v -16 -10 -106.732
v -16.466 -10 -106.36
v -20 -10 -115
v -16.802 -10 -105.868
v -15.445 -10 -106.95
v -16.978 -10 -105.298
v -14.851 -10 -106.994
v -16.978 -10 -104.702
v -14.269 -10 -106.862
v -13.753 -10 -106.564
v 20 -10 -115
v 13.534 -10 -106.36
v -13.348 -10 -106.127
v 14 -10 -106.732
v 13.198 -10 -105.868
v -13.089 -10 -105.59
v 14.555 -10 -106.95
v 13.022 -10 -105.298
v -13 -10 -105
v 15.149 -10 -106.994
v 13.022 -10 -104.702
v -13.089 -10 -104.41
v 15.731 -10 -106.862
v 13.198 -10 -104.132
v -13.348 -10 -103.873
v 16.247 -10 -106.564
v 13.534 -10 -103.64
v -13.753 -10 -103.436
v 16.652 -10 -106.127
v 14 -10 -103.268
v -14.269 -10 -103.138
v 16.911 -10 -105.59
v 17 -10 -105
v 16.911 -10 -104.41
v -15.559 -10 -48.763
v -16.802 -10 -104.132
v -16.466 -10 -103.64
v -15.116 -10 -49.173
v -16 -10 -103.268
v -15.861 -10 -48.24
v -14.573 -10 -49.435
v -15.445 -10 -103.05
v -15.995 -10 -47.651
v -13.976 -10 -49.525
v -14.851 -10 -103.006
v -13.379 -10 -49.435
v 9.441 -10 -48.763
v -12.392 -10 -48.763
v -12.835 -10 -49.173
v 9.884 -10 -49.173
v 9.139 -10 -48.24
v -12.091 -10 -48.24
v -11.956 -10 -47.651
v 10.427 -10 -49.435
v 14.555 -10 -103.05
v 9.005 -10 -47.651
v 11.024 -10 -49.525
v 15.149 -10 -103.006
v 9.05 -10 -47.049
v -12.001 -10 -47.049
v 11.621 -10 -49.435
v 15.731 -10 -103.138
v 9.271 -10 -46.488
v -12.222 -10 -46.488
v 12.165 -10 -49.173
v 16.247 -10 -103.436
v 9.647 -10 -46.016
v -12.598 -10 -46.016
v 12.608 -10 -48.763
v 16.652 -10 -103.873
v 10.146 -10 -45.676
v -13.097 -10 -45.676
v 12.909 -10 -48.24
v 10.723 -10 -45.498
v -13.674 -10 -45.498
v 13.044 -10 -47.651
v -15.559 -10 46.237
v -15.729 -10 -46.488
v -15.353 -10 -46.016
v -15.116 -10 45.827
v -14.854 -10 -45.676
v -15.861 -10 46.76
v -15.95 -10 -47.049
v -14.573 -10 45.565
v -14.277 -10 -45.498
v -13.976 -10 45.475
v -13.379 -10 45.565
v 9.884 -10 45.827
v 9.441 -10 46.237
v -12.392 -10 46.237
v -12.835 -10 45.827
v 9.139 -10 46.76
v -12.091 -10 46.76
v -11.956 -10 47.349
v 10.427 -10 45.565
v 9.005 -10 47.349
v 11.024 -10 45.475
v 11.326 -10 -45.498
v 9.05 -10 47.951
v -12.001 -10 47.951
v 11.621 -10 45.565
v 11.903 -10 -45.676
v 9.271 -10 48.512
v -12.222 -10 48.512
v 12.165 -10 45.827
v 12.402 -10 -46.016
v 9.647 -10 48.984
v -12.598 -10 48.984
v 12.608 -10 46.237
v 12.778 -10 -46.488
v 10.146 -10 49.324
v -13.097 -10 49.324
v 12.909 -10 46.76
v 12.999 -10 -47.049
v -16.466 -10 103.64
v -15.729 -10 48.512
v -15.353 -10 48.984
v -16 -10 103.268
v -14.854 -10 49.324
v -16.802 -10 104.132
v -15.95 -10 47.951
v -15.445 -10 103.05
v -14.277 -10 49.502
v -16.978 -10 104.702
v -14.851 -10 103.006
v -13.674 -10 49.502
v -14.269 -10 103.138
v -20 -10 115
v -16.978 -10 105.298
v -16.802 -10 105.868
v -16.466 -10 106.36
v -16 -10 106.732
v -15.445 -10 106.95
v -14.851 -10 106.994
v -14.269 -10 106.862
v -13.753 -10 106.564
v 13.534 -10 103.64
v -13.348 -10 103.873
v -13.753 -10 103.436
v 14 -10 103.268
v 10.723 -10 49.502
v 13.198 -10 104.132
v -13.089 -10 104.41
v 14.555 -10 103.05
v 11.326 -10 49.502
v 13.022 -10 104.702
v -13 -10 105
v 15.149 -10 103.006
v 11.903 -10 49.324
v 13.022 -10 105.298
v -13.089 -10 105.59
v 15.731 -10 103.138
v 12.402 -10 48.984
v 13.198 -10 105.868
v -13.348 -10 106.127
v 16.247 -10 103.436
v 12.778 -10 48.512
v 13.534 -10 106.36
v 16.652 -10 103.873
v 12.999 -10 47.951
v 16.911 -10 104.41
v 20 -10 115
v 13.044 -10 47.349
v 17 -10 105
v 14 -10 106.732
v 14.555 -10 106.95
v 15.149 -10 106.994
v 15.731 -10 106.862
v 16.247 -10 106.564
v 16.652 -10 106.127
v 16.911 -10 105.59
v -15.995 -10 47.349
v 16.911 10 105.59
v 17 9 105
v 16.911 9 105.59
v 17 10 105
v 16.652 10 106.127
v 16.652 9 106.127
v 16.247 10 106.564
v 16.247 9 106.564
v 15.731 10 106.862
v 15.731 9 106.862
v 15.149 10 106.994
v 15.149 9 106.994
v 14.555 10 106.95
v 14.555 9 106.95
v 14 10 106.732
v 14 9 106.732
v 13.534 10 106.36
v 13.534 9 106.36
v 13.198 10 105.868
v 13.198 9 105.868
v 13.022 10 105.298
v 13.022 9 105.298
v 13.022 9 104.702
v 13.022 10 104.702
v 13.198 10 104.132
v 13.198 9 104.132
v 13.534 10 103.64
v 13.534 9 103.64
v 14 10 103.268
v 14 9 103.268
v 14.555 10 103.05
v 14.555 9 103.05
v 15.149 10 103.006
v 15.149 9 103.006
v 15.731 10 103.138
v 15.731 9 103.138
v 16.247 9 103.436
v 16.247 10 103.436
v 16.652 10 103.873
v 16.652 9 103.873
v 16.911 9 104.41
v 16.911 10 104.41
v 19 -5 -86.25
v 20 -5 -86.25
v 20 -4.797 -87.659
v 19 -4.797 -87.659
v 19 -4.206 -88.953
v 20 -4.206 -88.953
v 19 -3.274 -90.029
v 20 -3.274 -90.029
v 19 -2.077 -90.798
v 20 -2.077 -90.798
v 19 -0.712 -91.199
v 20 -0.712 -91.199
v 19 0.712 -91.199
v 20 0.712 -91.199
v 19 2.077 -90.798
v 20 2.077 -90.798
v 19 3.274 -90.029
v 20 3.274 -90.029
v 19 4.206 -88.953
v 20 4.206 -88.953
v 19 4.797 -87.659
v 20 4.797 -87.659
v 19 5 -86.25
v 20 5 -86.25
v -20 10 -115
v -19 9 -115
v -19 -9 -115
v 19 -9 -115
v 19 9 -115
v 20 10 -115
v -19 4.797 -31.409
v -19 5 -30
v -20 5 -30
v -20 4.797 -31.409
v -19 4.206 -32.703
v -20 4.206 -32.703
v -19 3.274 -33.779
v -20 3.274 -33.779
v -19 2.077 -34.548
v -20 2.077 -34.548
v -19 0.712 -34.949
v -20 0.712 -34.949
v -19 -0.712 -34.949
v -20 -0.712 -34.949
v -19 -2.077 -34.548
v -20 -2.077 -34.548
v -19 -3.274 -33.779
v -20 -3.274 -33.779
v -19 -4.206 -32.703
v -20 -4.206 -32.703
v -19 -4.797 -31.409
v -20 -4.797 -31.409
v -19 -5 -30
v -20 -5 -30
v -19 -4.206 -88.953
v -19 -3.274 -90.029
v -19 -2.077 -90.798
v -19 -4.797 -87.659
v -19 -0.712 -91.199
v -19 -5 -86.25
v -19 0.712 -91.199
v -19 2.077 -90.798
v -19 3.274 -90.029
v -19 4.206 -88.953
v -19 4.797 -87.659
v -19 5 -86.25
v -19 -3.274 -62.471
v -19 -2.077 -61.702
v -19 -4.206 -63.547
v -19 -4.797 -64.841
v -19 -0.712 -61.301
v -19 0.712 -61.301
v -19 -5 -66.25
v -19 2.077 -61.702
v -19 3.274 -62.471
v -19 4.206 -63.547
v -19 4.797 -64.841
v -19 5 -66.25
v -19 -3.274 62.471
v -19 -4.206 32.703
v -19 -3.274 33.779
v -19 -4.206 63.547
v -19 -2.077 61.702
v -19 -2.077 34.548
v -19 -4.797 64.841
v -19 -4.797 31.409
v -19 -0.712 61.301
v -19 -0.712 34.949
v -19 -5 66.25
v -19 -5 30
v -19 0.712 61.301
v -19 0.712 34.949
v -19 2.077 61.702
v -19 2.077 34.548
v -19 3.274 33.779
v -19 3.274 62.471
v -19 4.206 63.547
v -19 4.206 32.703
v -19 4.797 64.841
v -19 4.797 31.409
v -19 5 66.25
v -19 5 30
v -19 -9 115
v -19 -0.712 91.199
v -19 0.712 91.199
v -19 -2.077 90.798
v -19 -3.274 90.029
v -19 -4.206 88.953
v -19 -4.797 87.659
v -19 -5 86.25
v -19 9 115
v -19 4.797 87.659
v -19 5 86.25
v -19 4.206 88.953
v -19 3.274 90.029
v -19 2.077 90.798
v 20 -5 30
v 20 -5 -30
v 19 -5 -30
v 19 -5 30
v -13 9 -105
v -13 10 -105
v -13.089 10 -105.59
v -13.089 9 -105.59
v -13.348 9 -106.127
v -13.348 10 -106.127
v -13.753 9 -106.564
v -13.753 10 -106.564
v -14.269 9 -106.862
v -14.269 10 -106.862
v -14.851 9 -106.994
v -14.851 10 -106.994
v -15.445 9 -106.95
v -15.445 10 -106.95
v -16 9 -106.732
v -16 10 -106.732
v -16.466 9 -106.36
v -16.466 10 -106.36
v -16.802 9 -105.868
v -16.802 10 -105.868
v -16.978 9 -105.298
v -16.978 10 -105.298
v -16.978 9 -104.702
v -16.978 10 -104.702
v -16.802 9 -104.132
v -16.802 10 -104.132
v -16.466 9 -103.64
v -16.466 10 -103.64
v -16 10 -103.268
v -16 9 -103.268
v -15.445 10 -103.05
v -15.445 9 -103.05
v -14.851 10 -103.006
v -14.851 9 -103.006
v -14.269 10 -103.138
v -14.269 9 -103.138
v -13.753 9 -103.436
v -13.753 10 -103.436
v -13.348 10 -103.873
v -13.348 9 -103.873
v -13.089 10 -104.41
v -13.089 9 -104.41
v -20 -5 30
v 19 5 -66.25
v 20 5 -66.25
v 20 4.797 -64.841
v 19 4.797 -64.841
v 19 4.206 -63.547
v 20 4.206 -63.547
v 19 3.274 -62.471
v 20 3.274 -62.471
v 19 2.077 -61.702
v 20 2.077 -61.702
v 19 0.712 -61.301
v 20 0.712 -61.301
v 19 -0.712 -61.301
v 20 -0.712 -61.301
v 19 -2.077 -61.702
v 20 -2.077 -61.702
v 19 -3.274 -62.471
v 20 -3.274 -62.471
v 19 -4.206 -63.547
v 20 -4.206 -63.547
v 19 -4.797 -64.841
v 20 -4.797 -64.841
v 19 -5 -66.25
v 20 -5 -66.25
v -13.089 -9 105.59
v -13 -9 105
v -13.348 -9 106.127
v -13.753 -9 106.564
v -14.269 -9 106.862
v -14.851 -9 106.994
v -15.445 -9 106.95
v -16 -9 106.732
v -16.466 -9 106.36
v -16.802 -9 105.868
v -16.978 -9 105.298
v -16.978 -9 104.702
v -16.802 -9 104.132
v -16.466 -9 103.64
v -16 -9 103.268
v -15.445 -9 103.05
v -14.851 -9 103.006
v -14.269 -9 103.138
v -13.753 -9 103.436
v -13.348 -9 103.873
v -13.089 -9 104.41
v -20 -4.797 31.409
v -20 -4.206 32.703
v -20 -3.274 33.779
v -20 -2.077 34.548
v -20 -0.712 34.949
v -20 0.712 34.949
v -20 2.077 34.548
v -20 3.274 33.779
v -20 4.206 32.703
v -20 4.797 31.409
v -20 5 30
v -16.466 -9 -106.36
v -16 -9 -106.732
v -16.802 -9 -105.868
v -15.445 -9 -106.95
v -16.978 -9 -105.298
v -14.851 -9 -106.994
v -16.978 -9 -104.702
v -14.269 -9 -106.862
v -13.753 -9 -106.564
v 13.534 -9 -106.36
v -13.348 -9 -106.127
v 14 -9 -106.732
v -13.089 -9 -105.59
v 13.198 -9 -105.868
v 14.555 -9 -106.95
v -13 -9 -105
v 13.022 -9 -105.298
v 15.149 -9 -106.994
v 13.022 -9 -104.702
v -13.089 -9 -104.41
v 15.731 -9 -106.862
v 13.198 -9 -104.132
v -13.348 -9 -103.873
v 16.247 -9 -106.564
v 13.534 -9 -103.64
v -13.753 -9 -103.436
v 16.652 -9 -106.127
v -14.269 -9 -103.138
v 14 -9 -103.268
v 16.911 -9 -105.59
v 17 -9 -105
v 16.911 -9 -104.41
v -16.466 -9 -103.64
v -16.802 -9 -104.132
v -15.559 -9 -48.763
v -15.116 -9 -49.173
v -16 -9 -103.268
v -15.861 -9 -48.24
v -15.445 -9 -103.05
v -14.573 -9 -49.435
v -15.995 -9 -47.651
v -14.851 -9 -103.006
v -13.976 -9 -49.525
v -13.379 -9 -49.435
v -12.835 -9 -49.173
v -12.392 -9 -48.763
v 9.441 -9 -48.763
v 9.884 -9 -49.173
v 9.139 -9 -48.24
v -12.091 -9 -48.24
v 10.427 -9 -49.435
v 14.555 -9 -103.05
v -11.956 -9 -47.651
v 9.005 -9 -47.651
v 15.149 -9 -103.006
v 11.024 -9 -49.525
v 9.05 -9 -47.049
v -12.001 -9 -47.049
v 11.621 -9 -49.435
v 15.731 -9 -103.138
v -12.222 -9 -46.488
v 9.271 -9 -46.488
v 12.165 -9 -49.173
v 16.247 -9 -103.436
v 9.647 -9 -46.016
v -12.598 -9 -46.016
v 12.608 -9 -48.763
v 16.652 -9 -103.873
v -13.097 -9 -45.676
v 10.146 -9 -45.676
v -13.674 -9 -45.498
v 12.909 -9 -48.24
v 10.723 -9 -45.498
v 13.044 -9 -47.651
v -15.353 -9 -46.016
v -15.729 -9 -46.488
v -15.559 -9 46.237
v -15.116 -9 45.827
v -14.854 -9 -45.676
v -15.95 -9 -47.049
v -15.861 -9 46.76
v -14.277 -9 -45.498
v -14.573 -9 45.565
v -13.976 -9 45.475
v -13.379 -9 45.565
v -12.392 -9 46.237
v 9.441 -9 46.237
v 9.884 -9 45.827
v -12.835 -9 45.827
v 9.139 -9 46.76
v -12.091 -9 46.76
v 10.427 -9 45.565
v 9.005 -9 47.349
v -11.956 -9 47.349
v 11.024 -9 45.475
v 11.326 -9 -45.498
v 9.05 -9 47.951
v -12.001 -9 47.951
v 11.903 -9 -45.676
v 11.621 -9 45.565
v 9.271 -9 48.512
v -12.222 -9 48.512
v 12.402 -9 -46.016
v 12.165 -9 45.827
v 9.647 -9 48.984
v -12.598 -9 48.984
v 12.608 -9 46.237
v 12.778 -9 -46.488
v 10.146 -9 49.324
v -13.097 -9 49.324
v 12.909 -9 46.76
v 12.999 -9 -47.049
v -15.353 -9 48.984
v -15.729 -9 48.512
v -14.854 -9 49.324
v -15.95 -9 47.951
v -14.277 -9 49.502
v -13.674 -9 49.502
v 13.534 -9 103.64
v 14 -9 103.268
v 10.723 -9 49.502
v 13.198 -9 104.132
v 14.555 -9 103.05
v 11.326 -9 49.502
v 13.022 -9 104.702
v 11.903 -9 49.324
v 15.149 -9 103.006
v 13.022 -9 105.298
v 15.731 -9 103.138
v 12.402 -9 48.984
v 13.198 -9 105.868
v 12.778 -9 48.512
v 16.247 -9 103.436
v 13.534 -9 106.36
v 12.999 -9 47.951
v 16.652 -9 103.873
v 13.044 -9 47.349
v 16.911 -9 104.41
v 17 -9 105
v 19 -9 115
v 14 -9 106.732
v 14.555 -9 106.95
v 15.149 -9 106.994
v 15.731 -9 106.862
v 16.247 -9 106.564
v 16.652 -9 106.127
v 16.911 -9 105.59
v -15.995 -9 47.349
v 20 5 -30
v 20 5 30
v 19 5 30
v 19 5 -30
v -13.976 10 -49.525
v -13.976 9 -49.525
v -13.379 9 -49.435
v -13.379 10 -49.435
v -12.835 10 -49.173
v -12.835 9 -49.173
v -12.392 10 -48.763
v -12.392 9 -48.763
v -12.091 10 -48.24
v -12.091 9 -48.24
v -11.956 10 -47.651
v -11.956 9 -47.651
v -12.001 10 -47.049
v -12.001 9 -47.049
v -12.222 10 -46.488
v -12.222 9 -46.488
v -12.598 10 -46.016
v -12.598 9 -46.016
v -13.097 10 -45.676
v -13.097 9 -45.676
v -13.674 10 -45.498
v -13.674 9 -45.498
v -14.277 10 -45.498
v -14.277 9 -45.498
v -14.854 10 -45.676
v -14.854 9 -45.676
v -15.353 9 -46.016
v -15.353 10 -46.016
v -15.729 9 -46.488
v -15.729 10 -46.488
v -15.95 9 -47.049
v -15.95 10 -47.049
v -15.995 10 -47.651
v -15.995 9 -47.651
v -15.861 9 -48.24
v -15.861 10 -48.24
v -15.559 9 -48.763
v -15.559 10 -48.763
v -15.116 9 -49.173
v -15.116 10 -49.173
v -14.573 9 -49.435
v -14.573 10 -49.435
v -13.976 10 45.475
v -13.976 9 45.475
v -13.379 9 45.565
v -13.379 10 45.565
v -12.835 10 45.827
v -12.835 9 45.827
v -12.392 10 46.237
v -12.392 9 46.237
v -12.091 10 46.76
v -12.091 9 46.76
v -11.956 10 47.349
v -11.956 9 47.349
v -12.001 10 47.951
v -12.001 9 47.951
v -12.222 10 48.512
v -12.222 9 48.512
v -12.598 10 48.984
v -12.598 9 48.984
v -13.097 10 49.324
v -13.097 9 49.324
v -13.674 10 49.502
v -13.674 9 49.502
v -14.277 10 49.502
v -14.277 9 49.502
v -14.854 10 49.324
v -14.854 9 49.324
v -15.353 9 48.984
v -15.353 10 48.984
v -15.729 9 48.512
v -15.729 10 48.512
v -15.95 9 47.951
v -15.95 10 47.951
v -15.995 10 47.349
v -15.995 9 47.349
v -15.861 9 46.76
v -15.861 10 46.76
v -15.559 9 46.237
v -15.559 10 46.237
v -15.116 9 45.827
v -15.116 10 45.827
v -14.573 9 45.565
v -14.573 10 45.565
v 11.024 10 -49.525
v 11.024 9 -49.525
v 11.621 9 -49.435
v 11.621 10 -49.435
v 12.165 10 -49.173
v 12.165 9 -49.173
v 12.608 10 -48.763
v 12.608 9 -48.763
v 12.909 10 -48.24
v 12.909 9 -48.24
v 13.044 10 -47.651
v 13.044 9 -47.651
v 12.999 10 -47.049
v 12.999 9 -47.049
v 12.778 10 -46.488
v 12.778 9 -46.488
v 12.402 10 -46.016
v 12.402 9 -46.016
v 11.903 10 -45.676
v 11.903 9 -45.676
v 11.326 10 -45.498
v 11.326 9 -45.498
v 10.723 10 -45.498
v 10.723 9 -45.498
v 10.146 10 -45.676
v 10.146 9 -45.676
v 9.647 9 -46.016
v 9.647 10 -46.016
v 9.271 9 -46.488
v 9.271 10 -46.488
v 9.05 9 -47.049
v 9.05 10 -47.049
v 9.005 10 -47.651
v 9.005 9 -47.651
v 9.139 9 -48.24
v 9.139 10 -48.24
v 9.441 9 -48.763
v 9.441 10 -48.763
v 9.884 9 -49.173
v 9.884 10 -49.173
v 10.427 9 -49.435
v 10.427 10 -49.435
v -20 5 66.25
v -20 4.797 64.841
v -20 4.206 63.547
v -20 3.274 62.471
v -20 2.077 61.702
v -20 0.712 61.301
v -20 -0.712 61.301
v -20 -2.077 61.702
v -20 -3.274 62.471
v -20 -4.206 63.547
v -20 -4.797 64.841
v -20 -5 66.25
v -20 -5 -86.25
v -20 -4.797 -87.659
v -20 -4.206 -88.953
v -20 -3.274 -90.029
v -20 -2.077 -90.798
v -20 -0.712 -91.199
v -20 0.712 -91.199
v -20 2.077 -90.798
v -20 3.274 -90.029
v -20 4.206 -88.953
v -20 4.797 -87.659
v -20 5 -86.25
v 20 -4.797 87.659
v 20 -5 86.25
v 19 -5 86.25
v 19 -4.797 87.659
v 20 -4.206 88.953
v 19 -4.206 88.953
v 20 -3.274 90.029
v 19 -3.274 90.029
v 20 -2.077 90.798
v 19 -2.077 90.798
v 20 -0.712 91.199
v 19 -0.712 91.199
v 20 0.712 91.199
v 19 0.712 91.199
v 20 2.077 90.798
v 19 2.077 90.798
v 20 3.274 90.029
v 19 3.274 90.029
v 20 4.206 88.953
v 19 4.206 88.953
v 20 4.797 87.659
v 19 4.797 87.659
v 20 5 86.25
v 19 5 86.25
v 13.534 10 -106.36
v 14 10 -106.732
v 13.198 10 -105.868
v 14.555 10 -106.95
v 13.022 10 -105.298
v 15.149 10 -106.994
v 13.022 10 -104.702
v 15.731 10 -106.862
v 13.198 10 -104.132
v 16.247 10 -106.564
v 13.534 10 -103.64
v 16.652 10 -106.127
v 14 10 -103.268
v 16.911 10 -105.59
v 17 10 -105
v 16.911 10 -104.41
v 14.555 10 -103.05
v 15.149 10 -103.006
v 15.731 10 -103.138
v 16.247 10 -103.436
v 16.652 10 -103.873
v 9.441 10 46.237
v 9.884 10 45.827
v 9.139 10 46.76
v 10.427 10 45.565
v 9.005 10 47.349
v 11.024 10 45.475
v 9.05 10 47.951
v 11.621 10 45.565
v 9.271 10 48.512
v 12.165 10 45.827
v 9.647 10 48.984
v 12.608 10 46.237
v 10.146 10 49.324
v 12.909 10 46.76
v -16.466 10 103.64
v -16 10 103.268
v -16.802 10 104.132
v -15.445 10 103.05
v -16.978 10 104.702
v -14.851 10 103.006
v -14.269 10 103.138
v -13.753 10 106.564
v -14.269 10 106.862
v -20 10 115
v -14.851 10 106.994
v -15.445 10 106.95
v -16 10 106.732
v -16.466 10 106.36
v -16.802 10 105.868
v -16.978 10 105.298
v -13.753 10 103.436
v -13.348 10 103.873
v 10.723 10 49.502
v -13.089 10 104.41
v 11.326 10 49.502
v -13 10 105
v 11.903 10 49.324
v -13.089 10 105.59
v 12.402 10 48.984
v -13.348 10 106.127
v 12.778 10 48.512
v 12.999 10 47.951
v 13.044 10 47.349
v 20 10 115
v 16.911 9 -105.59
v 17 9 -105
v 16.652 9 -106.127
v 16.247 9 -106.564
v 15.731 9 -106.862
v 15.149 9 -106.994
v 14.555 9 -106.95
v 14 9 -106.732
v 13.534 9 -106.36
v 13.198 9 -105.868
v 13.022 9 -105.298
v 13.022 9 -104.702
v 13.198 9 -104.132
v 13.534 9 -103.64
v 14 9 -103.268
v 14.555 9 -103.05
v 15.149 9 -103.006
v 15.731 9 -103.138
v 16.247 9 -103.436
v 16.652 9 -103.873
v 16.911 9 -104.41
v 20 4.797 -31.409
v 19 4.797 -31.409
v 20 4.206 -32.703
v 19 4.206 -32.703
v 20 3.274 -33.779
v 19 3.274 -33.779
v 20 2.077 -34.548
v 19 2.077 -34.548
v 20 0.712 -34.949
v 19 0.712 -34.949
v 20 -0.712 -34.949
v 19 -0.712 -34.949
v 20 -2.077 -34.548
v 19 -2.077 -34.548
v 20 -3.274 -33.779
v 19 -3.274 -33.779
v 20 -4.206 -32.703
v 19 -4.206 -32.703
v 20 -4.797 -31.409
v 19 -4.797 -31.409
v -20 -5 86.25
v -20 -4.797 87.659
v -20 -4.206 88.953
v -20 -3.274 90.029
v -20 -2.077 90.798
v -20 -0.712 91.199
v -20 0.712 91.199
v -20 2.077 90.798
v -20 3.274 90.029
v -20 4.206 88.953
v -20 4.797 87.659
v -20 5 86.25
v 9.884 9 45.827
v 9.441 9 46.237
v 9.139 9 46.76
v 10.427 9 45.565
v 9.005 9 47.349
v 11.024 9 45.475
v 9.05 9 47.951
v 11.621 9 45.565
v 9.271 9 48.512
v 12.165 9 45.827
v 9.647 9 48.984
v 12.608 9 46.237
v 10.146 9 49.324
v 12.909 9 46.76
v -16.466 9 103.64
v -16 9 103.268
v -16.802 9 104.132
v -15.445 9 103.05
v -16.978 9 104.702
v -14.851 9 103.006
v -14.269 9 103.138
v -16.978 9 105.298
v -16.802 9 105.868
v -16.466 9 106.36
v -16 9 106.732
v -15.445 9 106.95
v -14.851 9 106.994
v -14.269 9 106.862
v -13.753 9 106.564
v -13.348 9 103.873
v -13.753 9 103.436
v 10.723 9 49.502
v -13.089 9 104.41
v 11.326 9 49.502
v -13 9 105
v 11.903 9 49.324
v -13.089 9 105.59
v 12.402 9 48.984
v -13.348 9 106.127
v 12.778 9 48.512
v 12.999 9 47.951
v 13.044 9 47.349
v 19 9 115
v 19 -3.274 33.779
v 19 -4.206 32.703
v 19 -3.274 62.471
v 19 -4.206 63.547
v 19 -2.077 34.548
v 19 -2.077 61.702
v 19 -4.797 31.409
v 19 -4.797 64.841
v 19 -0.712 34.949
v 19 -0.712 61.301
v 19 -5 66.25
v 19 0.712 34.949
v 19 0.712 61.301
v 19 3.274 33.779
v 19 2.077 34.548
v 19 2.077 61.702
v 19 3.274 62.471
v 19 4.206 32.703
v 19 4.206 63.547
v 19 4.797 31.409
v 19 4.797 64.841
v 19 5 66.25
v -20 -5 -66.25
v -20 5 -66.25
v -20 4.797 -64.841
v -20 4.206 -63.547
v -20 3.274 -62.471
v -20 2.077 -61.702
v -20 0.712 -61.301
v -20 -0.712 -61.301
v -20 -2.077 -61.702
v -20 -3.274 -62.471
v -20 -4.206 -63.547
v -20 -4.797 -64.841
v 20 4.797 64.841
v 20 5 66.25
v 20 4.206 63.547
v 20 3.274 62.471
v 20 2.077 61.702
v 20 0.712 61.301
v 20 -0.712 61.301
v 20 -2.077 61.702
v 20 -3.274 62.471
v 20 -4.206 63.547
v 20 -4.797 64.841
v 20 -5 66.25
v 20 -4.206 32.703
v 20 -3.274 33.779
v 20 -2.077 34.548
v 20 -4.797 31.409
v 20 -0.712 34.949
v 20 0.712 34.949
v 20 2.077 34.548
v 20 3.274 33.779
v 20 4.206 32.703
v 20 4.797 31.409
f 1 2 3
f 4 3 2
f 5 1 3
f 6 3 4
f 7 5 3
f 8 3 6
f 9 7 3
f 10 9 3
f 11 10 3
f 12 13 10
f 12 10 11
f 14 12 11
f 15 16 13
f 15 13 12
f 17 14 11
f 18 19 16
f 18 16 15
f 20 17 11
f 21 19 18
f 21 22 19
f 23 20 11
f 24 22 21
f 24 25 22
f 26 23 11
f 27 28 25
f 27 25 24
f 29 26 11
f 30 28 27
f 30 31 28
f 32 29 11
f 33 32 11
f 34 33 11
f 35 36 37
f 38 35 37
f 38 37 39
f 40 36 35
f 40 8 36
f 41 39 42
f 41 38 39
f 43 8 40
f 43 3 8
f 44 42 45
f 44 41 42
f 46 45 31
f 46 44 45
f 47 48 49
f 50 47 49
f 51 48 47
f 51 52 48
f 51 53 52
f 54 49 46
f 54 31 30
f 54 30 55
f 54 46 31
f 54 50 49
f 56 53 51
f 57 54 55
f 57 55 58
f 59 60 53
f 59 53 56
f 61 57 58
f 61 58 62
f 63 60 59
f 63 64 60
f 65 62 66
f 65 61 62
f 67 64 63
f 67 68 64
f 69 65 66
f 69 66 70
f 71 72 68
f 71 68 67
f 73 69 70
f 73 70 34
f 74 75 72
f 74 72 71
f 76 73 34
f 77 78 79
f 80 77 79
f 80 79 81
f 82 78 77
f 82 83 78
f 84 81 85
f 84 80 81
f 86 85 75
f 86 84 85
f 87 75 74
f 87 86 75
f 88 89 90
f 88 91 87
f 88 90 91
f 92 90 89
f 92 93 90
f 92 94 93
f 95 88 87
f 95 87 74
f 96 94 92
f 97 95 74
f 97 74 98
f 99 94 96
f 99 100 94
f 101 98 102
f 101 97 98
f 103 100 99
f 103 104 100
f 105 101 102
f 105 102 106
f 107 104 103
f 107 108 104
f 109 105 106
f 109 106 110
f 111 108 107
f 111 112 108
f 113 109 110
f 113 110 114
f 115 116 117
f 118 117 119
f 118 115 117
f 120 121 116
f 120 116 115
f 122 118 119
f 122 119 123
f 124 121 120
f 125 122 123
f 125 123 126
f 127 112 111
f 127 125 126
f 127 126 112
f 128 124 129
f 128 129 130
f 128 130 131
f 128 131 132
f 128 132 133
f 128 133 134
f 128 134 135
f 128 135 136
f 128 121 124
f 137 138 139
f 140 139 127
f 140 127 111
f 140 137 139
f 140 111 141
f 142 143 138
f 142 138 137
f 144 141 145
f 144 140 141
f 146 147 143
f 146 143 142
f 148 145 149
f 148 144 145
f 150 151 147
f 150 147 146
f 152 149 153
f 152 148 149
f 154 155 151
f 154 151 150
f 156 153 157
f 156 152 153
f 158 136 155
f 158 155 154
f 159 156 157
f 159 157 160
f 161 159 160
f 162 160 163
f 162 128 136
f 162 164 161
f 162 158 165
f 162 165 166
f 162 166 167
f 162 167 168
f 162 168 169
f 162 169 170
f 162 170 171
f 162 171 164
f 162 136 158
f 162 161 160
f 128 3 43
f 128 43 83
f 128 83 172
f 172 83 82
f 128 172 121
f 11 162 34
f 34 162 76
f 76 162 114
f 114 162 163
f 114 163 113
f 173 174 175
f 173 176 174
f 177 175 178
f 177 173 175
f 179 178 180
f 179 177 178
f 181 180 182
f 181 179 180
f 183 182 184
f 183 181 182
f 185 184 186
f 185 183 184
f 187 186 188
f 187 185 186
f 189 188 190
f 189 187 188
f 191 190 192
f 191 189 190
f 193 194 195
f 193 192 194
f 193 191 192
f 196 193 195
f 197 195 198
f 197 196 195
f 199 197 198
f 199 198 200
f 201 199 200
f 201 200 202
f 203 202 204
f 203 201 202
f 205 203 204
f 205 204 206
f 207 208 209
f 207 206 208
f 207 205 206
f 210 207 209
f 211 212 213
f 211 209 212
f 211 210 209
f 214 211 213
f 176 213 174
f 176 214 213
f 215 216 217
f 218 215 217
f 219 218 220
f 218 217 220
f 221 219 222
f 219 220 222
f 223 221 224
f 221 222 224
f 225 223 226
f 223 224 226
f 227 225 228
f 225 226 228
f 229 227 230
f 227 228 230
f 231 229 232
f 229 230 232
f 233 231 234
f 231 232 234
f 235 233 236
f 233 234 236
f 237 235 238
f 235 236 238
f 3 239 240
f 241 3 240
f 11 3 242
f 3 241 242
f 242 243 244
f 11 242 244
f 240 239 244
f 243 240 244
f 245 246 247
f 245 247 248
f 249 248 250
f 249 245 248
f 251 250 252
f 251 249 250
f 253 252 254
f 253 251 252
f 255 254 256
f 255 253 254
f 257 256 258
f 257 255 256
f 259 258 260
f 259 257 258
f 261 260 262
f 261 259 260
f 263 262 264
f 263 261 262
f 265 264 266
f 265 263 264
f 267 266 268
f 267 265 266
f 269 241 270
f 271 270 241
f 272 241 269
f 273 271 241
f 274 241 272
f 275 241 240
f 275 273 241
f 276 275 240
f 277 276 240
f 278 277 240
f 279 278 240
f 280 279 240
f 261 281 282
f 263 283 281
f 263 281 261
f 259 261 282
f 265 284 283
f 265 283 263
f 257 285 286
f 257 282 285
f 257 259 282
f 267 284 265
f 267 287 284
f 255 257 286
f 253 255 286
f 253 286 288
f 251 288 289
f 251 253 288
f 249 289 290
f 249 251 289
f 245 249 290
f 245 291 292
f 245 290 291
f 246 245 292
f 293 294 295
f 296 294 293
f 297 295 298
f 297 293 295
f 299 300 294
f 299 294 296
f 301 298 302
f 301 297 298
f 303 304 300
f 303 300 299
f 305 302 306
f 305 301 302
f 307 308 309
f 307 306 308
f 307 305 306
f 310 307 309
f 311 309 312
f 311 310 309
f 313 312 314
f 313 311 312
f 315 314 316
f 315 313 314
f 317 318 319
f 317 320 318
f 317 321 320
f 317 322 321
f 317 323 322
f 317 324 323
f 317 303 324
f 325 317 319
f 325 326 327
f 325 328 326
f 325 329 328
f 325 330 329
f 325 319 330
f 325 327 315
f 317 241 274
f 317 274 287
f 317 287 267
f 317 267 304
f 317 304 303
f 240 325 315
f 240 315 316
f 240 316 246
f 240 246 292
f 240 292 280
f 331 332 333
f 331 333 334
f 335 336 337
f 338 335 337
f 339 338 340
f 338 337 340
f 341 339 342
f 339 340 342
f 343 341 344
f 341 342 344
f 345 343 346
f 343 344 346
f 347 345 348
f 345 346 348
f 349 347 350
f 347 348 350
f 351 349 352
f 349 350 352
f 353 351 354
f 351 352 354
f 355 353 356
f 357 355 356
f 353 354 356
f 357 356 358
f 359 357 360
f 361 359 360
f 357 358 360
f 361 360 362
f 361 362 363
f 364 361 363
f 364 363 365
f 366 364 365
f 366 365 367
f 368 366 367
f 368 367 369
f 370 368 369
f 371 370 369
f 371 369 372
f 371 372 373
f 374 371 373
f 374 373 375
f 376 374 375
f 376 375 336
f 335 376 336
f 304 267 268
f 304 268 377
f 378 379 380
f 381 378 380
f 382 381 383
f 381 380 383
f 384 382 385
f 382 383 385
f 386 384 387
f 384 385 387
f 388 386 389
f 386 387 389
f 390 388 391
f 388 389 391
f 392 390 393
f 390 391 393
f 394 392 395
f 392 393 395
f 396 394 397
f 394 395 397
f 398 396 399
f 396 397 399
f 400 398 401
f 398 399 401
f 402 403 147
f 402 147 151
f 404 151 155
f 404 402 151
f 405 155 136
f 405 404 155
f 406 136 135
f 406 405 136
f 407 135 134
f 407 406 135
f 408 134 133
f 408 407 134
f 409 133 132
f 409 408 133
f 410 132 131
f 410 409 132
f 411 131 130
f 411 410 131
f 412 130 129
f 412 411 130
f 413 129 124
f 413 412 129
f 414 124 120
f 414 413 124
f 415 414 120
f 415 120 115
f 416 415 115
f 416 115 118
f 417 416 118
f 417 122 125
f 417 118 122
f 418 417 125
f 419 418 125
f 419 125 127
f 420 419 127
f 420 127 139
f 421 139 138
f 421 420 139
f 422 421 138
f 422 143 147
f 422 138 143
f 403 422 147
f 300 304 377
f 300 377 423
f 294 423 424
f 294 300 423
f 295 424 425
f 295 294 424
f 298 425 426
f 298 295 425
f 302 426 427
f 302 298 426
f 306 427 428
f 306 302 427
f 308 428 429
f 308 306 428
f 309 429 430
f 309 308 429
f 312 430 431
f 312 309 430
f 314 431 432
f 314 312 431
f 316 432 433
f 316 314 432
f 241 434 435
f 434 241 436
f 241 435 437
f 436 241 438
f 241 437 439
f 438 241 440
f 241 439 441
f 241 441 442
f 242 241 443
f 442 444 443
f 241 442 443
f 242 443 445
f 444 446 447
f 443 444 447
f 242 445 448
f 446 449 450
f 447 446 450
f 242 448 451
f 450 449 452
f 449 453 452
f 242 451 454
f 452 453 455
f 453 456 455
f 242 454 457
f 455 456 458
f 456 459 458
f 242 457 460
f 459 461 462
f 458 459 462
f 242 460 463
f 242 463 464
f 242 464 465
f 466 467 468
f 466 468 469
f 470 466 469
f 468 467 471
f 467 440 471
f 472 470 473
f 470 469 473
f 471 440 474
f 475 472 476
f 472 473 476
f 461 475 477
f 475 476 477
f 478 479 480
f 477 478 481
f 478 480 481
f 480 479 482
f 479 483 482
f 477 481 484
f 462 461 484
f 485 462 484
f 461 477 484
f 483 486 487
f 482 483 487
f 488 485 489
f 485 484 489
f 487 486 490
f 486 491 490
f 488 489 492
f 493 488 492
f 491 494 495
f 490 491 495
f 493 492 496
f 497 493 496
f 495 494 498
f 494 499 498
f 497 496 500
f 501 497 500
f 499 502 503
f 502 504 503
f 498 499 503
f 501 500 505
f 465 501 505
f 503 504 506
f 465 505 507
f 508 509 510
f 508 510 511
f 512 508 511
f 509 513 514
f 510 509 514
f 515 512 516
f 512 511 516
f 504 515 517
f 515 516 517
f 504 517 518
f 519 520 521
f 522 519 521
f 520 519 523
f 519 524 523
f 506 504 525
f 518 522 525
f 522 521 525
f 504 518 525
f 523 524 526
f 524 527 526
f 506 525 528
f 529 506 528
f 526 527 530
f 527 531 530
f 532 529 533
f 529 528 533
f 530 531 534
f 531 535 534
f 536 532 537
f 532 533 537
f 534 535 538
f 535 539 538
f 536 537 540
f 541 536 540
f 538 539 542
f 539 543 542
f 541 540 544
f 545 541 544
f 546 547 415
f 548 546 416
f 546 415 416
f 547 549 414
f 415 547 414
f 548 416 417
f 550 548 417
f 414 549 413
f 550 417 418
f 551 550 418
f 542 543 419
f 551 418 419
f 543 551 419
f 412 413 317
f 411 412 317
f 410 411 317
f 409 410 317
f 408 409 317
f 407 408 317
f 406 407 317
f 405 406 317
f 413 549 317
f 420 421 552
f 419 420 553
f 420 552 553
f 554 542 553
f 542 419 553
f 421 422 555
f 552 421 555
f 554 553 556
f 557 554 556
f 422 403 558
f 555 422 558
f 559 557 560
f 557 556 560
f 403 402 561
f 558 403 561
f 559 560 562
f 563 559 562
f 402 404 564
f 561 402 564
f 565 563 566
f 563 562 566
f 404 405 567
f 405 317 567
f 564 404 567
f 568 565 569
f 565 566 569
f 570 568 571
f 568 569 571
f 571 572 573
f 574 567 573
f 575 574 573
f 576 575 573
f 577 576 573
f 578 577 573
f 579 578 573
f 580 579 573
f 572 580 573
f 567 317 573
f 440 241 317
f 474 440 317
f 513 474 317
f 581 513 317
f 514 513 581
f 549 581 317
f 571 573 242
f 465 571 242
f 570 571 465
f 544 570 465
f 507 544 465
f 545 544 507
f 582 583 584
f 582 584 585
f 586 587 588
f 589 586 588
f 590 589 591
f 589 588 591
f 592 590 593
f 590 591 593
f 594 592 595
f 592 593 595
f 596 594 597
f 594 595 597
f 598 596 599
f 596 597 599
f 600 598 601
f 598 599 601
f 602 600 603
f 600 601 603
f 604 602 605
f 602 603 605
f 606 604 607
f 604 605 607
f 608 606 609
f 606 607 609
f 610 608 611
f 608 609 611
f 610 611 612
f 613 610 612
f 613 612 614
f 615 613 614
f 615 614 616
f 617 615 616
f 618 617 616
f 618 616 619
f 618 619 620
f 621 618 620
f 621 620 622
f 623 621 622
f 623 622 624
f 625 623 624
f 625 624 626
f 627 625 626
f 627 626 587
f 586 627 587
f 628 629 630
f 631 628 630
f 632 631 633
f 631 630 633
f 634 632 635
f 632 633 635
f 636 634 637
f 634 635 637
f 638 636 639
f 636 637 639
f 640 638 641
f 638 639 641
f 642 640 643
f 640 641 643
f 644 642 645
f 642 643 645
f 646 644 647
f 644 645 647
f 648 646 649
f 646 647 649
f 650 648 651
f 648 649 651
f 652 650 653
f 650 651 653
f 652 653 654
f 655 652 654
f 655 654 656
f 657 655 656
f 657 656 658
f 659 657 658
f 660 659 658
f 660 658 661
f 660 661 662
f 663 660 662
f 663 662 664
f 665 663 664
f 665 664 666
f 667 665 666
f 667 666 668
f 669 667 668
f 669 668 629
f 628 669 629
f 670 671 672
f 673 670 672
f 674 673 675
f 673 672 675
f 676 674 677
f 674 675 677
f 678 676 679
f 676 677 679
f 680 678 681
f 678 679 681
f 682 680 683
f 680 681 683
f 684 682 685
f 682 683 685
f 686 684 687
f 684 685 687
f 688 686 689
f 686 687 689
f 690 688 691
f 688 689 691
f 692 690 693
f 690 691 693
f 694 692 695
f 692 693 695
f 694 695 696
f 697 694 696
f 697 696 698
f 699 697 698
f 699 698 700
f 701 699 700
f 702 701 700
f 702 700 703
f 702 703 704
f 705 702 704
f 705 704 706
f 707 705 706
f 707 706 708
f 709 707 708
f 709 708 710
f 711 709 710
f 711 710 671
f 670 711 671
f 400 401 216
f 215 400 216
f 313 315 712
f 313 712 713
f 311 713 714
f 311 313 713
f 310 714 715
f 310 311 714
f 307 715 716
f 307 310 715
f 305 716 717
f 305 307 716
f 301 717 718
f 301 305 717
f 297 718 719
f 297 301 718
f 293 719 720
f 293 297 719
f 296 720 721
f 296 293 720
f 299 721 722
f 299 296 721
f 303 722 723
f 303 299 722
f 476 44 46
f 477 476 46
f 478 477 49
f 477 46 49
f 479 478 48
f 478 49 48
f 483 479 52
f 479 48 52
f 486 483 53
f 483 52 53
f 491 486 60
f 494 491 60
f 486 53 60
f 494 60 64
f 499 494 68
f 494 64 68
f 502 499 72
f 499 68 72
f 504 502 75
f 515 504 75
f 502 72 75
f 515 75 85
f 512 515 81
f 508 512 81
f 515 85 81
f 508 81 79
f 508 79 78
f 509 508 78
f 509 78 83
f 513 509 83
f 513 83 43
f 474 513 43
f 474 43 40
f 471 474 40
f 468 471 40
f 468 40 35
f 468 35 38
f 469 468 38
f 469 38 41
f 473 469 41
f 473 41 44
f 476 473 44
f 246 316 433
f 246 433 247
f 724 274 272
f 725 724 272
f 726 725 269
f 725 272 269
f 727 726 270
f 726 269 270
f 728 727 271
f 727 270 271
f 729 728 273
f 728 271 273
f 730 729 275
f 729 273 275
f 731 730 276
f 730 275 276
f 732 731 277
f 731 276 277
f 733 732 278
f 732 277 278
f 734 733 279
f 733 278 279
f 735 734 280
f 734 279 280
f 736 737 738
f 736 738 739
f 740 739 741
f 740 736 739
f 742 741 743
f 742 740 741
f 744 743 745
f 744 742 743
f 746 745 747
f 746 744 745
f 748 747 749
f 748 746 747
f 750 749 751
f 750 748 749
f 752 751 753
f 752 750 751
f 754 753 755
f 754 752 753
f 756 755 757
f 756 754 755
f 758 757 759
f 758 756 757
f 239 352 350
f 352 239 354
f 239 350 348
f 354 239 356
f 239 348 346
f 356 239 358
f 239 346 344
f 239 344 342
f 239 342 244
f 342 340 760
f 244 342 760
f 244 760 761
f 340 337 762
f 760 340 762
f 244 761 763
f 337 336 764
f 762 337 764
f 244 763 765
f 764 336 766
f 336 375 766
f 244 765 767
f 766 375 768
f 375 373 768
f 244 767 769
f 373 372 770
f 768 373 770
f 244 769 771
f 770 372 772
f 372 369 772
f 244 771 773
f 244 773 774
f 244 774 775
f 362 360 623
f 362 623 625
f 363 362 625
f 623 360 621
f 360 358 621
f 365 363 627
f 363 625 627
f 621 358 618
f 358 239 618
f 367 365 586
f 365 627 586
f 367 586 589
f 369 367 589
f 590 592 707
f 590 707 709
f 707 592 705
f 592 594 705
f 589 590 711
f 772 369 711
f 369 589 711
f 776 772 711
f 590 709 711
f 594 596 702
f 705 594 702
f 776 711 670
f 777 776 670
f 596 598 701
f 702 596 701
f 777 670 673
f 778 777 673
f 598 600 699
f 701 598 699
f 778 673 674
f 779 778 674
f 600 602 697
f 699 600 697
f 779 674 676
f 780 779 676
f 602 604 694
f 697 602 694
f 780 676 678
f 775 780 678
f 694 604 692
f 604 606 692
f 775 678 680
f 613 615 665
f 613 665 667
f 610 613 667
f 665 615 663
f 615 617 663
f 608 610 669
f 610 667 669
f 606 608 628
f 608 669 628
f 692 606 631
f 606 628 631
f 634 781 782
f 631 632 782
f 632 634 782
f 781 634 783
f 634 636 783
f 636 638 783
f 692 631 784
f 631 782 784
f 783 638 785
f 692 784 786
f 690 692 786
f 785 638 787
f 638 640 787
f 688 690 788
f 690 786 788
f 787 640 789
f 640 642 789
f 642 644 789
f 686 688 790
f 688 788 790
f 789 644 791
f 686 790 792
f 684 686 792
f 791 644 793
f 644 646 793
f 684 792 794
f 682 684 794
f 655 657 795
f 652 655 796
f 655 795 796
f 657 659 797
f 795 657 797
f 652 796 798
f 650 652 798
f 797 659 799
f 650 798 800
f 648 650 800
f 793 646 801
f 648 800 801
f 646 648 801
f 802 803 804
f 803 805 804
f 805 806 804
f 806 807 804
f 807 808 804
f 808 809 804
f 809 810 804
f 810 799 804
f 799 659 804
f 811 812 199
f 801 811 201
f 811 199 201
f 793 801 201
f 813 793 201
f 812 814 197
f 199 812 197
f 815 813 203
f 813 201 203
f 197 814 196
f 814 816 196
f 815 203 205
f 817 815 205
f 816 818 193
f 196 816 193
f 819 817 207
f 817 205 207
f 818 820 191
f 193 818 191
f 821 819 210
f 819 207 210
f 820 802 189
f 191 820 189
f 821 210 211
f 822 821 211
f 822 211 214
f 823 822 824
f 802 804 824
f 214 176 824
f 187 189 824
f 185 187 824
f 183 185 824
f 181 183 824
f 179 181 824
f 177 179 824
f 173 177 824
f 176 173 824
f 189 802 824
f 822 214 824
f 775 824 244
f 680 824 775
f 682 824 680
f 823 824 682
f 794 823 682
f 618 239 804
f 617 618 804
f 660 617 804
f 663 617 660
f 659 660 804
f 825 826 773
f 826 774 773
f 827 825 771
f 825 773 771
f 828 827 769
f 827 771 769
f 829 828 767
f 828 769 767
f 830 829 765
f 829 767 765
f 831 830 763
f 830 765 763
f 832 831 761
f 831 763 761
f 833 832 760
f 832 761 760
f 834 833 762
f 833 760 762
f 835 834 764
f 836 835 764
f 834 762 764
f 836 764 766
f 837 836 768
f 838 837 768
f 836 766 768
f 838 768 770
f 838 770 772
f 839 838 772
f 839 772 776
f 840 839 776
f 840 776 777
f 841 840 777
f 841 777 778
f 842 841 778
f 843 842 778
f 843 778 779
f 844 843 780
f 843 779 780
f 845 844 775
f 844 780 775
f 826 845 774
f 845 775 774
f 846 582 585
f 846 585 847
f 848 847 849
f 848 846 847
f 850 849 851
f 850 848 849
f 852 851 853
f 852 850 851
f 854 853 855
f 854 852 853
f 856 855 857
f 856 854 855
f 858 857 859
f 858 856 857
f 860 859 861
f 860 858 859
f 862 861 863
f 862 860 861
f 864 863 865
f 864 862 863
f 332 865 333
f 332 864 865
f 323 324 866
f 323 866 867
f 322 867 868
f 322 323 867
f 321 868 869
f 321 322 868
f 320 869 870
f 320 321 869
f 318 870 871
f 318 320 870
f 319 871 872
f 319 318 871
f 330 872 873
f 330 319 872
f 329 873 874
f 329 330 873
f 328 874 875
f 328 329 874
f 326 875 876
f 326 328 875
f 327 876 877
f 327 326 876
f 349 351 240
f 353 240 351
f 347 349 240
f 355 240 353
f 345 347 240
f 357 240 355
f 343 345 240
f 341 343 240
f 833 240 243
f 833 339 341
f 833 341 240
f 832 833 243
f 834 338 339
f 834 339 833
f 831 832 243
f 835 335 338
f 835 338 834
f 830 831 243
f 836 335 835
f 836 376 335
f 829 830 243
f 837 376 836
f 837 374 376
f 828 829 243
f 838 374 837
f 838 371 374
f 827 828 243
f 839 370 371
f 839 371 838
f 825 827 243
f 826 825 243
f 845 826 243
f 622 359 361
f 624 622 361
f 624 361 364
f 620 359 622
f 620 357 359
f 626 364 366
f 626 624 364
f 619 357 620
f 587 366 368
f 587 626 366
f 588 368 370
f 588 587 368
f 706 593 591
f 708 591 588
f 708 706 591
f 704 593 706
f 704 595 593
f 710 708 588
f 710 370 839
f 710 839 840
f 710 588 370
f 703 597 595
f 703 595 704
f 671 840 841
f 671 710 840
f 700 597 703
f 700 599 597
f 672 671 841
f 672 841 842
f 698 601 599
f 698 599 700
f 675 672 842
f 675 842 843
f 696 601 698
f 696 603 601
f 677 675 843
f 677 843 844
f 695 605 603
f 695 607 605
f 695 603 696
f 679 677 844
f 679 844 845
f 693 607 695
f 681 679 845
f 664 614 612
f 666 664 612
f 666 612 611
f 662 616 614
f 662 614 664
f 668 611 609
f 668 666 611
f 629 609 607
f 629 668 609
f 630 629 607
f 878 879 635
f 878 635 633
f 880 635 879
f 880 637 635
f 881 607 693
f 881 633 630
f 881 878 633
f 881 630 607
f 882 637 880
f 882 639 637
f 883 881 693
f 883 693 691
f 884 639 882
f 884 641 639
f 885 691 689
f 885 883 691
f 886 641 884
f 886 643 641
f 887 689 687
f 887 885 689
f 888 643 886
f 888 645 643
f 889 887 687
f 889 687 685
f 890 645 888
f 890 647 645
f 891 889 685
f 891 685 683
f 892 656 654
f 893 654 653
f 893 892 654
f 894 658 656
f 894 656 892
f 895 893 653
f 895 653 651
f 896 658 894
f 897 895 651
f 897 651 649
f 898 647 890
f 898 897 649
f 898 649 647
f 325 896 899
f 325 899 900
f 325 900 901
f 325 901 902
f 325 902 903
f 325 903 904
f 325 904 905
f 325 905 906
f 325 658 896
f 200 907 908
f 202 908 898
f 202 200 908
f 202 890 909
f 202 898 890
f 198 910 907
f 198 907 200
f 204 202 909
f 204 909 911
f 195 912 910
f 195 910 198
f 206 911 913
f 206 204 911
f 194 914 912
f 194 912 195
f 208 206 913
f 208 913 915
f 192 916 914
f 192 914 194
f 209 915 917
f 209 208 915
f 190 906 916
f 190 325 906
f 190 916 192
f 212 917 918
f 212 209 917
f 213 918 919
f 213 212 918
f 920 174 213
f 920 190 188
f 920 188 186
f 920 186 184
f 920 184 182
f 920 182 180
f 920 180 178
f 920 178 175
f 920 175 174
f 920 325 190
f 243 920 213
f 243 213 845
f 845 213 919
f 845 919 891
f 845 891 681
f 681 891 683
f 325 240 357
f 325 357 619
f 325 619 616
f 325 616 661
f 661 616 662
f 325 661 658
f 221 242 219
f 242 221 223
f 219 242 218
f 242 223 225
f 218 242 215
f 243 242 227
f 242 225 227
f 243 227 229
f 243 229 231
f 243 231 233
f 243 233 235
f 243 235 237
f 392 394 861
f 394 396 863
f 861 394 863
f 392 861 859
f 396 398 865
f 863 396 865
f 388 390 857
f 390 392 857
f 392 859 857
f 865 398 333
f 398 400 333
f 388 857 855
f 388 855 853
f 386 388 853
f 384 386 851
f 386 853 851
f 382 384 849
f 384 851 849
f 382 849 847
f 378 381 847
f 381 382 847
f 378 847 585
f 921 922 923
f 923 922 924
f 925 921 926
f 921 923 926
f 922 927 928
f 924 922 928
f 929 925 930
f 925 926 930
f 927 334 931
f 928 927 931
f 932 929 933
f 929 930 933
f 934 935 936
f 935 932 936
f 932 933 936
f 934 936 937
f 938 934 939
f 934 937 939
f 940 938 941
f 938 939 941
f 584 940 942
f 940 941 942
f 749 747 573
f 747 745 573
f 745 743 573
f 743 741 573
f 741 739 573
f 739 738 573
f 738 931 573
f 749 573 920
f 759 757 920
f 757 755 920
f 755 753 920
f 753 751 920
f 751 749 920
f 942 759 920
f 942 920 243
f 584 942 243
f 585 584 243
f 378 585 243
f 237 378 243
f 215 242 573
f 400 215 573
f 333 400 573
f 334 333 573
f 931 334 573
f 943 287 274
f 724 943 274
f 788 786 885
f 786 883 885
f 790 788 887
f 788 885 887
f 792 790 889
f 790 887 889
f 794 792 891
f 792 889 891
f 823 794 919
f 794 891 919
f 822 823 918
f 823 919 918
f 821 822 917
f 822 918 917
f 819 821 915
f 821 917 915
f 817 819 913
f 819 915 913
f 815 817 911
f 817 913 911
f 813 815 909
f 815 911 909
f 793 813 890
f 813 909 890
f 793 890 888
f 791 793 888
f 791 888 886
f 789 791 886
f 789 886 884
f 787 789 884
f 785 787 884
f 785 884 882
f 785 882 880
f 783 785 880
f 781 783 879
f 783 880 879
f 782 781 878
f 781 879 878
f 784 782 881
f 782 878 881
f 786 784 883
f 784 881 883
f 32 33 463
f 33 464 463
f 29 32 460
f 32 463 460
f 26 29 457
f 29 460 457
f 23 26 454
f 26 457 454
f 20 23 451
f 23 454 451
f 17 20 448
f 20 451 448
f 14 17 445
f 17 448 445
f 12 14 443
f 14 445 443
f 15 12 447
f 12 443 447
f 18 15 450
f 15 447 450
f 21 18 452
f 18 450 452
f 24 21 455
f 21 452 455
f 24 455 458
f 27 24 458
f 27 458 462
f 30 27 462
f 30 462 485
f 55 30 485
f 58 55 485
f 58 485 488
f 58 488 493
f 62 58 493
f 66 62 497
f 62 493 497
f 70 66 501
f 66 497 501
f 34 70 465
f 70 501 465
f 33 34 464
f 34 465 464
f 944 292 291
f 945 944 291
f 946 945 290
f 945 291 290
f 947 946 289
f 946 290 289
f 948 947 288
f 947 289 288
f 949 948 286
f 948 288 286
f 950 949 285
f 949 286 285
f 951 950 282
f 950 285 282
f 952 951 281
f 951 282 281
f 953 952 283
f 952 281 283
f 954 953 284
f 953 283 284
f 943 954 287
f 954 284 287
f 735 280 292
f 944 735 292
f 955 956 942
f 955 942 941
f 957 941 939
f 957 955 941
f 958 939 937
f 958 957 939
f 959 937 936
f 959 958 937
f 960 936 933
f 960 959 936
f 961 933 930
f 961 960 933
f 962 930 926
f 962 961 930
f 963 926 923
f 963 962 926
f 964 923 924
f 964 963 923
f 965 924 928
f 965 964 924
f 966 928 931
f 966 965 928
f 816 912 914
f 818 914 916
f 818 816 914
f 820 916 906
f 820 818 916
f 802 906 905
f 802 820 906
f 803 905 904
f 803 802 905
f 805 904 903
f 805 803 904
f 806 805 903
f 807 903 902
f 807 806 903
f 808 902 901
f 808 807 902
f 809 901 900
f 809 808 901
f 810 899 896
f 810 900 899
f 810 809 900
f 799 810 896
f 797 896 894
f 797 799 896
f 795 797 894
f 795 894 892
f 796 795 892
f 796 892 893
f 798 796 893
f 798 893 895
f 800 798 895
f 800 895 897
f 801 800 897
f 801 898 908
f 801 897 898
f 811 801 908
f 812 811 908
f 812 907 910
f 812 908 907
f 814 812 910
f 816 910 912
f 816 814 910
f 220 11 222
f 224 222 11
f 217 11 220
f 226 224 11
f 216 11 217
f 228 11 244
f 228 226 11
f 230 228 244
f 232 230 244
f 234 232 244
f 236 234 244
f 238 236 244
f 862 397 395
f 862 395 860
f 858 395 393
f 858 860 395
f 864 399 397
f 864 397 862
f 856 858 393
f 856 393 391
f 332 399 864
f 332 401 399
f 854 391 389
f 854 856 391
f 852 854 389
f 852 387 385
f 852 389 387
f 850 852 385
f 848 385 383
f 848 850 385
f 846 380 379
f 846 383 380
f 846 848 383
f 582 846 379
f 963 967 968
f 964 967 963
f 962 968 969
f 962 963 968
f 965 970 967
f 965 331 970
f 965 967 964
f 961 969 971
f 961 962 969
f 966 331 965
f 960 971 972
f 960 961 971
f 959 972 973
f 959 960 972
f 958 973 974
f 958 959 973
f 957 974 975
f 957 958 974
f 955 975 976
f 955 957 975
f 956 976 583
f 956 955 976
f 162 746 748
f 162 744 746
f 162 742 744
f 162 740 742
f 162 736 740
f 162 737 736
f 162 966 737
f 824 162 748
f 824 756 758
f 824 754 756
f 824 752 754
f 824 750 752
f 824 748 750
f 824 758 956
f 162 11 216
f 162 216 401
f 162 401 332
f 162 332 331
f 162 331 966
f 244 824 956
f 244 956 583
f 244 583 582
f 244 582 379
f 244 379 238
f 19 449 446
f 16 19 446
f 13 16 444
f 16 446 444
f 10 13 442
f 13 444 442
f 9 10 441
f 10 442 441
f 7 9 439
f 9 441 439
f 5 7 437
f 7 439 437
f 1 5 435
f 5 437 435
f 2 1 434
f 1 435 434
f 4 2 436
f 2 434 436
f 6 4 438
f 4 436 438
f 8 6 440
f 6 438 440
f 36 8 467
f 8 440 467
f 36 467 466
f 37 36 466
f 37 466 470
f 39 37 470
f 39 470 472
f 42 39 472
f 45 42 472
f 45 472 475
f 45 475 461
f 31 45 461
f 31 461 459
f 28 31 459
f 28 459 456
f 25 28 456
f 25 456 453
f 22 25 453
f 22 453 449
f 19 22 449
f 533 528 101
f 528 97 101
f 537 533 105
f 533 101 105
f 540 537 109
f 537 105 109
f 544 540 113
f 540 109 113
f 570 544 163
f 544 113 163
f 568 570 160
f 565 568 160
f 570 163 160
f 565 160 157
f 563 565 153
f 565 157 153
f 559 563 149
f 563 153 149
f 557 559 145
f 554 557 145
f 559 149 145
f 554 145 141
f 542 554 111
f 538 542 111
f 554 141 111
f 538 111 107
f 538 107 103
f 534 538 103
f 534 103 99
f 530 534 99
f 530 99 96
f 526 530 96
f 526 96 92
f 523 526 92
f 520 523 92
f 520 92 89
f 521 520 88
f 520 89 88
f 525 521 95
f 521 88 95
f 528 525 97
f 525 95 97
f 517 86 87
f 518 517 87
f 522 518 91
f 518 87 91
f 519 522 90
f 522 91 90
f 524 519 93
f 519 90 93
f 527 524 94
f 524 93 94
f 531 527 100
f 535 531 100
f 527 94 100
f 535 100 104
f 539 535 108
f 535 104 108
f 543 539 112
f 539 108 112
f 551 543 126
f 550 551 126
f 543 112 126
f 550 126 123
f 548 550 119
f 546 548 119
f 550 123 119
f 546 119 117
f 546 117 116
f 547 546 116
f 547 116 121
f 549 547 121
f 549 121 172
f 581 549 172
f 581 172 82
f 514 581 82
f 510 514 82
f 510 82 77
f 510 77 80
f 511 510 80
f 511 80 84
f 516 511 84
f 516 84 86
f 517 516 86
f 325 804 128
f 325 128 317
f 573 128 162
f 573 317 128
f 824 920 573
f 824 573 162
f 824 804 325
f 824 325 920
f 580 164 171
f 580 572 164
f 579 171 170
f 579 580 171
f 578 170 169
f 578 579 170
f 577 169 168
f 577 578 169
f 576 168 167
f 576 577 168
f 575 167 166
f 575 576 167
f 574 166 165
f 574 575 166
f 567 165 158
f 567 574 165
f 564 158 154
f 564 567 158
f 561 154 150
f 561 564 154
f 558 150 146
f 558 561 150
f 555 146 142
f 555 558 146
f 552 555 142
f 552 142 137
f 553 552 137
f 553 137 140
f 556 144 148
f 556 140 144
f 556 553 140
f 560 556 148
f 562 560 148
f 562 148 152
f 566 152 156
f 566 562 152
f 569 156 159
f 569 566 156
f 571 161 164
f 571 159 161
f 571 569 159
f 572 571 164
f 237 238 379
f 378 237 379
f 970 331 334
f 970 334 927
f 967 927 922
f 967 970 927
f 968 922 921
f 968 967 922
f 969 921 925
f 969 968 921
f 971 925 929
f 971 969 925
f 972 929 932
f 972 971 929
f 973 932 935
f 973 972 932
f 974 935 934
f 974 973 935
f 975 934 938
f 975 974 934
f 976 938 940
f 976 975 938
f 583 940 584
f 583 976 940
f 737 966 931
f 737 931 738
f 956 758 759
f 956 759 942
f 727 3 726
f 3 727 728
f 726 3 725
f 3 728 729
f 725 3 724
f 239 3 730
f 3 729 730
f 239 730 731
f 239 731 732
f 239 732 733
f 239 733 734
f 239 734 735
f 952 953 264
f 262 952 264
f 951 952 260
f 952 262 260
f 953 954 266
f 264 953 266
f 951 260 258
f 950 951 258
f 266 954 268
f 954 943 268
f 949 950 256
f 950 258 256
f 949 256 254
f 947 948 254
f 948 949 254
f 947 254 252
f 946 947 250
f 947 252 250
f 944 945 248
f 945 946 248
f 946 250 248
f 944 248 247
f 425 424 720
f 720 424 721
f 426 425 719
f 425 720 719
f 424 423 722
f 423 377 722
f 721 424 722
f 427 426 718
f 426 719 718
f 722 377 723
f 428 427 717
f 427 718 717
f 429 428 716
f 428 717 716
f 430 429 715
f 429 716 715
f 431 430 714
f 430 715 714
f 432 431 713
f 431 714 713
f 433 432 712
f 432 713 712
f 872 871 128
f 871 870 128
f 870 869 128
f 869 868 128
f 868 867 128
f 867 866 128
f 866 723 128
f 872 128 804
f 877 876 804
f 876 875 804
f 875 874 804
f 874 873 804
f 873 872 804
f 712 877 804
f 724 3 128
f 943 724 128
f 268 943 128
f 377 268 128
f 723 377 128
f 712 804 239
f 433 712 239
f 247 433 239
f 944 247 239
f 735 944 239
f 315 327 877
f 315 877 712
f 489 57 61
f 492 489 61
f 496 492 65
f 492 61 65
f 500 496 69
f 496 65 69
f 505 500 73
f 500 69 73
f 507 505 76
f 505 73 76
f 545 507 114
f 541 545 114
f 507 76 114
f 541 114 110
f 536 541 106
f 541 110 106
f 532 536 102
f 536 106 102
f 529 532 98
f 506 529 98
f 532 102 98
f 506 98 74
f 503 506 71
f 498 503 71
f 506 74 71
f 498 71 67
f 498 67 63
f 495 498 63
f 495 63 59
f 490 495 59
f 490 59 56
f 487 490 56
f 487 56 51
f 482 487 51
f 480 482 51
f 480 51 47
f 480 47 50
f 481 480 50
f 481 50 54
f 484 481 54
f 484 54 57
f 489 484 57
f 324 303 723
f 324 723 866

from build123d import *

# Parameters (mm, degrees)
SKETCH_1_W          = 40
SKETCH_1_H          = 20
SKETCH_1_W_2        = 38
SKETCH_1_H_2        = 18
EXTRUDE_1_DEPTH     = 115
SKETCH_2_R          = 2
CUT_EXTRUDE_1_DEPTH = 115
SKETCH_3_R          = 2.025
CUT_EXTRUDE_2_DEPTH = 35
CUT_EXTRUDE_3_DEPTH = 129.5
CUT_EXTRUDE_4_DEPTH = 129.5


with BuildPart() as part:
    # 草图1 → 凸台-拉伸1 (new, symmetric)
    with BuildSketch(Plane.XY):
        Rectangle(SKETCH_1_W, SKETCH_1_H)
        Rectangle(SKETCH_1_W_2, SKETCH_1_H_2, mode=Mode.SUBTRACT)
    extrude(amount=EXTRUDE_1_DEPTH, both=True)

    # 草图2 → 切除-拉伸1 (cut, symmetric)
    with BuildSketch(Plane(origin=(0, 10, 0), x_dir=(1, 0, 0), z_dir=(0, 1, 0))):
        with Locations((-15, 105)):
            Circle(SKETCH_2_R)
        with Locations((15, 105)):
            Circle(SKETCH_2_R)
    cut_extrude_1 = extrude(amount=CUT_EXTRUDE_1_DEPTH, both=True, mode=Mode.SUBTRACT)

    # 镜向1: 切除-拉伸1 across plane
    add(cut_extrude_1.mirror(Plane.XY), mode=Mode.SUBTRACT)

    # 草图3 → 切除-拉伸2 (cut, symmetric)
    with BuildSketch(Plane.XZ.offset(10)):
        with Locations(Location((-13.975679885, -47.500000831, 0), (0, 0, 270))):
            Circle(SKETCH_3_R)
        with Locations(Location((11.024320115, -47.500000831, 0), (0, 0, 270))):
            Circle(SKETCH_3_R)
        with Locations(Location((-13.975679885, 47.499999169, 0), (0, 0, 270))):
            Circle(SKETCH_3_R)
        with Locations(Location((11.024320115, 47.499999169, 0), (0, 0, 270))):
            Circle(SKETCH_3_R)
    extrude(amount=CUT_EXTRUDE_2_DEPTH, both=True, mode=Mode.SUBTRACT)

    # 草图4 → 切除-拉伸3 (cut, symmetric)
    with BuildSketch(Plane(origin=(20, 0, 0), x_dir=(0, 0, -1), z_dir=(1, 0, 0))):
        with BuildLine():
            Line((-30, 5), (30, 5))
            ThreePointArc((30, 5), (35, 0), (30, -5))
            Line((30, -5), (-30, -5))
            ThreePointArc((-30, -5), (-35, 0), (-30, 5))
        make_face()
    extrude(amount=CUT_EXTRUDE_3_DEPTH, both=True, mode=Mode.SUBTRACT)

    # 草图5 → 切除-拉伸4 (cut, symmetric)
    with BuildSketch(Plane(origin=(20, 0, 0), x_dir=(0, 0, -1), z_dir=(1, 0, 0))):
        with BuildLine():
            Line((-86.249999585, 5), (-66.249999585, 5))
            ThreePointArc((-66.249999585, 5), (-61.249999585, 0), (-66.249999585, -5))
            Line((-66.249999585, -5), (-86.249999585, -5))
            ThreePointArc((-86.249999585, -5), (-91.249999585, 0), (-86.249999585, 5))
        make_face()
    cut_extrude_4 = extrude(amount=CUT_EXTRUDE_4_DEPTH, both=True, mode=Mode.SUBTRACT)

    # 镜向2: 切除-拉伸4 across plane
    add(cut_extrude_4.mirror(Plane.XY), mode=Mode.SUBTRACT)


solid = part.part
